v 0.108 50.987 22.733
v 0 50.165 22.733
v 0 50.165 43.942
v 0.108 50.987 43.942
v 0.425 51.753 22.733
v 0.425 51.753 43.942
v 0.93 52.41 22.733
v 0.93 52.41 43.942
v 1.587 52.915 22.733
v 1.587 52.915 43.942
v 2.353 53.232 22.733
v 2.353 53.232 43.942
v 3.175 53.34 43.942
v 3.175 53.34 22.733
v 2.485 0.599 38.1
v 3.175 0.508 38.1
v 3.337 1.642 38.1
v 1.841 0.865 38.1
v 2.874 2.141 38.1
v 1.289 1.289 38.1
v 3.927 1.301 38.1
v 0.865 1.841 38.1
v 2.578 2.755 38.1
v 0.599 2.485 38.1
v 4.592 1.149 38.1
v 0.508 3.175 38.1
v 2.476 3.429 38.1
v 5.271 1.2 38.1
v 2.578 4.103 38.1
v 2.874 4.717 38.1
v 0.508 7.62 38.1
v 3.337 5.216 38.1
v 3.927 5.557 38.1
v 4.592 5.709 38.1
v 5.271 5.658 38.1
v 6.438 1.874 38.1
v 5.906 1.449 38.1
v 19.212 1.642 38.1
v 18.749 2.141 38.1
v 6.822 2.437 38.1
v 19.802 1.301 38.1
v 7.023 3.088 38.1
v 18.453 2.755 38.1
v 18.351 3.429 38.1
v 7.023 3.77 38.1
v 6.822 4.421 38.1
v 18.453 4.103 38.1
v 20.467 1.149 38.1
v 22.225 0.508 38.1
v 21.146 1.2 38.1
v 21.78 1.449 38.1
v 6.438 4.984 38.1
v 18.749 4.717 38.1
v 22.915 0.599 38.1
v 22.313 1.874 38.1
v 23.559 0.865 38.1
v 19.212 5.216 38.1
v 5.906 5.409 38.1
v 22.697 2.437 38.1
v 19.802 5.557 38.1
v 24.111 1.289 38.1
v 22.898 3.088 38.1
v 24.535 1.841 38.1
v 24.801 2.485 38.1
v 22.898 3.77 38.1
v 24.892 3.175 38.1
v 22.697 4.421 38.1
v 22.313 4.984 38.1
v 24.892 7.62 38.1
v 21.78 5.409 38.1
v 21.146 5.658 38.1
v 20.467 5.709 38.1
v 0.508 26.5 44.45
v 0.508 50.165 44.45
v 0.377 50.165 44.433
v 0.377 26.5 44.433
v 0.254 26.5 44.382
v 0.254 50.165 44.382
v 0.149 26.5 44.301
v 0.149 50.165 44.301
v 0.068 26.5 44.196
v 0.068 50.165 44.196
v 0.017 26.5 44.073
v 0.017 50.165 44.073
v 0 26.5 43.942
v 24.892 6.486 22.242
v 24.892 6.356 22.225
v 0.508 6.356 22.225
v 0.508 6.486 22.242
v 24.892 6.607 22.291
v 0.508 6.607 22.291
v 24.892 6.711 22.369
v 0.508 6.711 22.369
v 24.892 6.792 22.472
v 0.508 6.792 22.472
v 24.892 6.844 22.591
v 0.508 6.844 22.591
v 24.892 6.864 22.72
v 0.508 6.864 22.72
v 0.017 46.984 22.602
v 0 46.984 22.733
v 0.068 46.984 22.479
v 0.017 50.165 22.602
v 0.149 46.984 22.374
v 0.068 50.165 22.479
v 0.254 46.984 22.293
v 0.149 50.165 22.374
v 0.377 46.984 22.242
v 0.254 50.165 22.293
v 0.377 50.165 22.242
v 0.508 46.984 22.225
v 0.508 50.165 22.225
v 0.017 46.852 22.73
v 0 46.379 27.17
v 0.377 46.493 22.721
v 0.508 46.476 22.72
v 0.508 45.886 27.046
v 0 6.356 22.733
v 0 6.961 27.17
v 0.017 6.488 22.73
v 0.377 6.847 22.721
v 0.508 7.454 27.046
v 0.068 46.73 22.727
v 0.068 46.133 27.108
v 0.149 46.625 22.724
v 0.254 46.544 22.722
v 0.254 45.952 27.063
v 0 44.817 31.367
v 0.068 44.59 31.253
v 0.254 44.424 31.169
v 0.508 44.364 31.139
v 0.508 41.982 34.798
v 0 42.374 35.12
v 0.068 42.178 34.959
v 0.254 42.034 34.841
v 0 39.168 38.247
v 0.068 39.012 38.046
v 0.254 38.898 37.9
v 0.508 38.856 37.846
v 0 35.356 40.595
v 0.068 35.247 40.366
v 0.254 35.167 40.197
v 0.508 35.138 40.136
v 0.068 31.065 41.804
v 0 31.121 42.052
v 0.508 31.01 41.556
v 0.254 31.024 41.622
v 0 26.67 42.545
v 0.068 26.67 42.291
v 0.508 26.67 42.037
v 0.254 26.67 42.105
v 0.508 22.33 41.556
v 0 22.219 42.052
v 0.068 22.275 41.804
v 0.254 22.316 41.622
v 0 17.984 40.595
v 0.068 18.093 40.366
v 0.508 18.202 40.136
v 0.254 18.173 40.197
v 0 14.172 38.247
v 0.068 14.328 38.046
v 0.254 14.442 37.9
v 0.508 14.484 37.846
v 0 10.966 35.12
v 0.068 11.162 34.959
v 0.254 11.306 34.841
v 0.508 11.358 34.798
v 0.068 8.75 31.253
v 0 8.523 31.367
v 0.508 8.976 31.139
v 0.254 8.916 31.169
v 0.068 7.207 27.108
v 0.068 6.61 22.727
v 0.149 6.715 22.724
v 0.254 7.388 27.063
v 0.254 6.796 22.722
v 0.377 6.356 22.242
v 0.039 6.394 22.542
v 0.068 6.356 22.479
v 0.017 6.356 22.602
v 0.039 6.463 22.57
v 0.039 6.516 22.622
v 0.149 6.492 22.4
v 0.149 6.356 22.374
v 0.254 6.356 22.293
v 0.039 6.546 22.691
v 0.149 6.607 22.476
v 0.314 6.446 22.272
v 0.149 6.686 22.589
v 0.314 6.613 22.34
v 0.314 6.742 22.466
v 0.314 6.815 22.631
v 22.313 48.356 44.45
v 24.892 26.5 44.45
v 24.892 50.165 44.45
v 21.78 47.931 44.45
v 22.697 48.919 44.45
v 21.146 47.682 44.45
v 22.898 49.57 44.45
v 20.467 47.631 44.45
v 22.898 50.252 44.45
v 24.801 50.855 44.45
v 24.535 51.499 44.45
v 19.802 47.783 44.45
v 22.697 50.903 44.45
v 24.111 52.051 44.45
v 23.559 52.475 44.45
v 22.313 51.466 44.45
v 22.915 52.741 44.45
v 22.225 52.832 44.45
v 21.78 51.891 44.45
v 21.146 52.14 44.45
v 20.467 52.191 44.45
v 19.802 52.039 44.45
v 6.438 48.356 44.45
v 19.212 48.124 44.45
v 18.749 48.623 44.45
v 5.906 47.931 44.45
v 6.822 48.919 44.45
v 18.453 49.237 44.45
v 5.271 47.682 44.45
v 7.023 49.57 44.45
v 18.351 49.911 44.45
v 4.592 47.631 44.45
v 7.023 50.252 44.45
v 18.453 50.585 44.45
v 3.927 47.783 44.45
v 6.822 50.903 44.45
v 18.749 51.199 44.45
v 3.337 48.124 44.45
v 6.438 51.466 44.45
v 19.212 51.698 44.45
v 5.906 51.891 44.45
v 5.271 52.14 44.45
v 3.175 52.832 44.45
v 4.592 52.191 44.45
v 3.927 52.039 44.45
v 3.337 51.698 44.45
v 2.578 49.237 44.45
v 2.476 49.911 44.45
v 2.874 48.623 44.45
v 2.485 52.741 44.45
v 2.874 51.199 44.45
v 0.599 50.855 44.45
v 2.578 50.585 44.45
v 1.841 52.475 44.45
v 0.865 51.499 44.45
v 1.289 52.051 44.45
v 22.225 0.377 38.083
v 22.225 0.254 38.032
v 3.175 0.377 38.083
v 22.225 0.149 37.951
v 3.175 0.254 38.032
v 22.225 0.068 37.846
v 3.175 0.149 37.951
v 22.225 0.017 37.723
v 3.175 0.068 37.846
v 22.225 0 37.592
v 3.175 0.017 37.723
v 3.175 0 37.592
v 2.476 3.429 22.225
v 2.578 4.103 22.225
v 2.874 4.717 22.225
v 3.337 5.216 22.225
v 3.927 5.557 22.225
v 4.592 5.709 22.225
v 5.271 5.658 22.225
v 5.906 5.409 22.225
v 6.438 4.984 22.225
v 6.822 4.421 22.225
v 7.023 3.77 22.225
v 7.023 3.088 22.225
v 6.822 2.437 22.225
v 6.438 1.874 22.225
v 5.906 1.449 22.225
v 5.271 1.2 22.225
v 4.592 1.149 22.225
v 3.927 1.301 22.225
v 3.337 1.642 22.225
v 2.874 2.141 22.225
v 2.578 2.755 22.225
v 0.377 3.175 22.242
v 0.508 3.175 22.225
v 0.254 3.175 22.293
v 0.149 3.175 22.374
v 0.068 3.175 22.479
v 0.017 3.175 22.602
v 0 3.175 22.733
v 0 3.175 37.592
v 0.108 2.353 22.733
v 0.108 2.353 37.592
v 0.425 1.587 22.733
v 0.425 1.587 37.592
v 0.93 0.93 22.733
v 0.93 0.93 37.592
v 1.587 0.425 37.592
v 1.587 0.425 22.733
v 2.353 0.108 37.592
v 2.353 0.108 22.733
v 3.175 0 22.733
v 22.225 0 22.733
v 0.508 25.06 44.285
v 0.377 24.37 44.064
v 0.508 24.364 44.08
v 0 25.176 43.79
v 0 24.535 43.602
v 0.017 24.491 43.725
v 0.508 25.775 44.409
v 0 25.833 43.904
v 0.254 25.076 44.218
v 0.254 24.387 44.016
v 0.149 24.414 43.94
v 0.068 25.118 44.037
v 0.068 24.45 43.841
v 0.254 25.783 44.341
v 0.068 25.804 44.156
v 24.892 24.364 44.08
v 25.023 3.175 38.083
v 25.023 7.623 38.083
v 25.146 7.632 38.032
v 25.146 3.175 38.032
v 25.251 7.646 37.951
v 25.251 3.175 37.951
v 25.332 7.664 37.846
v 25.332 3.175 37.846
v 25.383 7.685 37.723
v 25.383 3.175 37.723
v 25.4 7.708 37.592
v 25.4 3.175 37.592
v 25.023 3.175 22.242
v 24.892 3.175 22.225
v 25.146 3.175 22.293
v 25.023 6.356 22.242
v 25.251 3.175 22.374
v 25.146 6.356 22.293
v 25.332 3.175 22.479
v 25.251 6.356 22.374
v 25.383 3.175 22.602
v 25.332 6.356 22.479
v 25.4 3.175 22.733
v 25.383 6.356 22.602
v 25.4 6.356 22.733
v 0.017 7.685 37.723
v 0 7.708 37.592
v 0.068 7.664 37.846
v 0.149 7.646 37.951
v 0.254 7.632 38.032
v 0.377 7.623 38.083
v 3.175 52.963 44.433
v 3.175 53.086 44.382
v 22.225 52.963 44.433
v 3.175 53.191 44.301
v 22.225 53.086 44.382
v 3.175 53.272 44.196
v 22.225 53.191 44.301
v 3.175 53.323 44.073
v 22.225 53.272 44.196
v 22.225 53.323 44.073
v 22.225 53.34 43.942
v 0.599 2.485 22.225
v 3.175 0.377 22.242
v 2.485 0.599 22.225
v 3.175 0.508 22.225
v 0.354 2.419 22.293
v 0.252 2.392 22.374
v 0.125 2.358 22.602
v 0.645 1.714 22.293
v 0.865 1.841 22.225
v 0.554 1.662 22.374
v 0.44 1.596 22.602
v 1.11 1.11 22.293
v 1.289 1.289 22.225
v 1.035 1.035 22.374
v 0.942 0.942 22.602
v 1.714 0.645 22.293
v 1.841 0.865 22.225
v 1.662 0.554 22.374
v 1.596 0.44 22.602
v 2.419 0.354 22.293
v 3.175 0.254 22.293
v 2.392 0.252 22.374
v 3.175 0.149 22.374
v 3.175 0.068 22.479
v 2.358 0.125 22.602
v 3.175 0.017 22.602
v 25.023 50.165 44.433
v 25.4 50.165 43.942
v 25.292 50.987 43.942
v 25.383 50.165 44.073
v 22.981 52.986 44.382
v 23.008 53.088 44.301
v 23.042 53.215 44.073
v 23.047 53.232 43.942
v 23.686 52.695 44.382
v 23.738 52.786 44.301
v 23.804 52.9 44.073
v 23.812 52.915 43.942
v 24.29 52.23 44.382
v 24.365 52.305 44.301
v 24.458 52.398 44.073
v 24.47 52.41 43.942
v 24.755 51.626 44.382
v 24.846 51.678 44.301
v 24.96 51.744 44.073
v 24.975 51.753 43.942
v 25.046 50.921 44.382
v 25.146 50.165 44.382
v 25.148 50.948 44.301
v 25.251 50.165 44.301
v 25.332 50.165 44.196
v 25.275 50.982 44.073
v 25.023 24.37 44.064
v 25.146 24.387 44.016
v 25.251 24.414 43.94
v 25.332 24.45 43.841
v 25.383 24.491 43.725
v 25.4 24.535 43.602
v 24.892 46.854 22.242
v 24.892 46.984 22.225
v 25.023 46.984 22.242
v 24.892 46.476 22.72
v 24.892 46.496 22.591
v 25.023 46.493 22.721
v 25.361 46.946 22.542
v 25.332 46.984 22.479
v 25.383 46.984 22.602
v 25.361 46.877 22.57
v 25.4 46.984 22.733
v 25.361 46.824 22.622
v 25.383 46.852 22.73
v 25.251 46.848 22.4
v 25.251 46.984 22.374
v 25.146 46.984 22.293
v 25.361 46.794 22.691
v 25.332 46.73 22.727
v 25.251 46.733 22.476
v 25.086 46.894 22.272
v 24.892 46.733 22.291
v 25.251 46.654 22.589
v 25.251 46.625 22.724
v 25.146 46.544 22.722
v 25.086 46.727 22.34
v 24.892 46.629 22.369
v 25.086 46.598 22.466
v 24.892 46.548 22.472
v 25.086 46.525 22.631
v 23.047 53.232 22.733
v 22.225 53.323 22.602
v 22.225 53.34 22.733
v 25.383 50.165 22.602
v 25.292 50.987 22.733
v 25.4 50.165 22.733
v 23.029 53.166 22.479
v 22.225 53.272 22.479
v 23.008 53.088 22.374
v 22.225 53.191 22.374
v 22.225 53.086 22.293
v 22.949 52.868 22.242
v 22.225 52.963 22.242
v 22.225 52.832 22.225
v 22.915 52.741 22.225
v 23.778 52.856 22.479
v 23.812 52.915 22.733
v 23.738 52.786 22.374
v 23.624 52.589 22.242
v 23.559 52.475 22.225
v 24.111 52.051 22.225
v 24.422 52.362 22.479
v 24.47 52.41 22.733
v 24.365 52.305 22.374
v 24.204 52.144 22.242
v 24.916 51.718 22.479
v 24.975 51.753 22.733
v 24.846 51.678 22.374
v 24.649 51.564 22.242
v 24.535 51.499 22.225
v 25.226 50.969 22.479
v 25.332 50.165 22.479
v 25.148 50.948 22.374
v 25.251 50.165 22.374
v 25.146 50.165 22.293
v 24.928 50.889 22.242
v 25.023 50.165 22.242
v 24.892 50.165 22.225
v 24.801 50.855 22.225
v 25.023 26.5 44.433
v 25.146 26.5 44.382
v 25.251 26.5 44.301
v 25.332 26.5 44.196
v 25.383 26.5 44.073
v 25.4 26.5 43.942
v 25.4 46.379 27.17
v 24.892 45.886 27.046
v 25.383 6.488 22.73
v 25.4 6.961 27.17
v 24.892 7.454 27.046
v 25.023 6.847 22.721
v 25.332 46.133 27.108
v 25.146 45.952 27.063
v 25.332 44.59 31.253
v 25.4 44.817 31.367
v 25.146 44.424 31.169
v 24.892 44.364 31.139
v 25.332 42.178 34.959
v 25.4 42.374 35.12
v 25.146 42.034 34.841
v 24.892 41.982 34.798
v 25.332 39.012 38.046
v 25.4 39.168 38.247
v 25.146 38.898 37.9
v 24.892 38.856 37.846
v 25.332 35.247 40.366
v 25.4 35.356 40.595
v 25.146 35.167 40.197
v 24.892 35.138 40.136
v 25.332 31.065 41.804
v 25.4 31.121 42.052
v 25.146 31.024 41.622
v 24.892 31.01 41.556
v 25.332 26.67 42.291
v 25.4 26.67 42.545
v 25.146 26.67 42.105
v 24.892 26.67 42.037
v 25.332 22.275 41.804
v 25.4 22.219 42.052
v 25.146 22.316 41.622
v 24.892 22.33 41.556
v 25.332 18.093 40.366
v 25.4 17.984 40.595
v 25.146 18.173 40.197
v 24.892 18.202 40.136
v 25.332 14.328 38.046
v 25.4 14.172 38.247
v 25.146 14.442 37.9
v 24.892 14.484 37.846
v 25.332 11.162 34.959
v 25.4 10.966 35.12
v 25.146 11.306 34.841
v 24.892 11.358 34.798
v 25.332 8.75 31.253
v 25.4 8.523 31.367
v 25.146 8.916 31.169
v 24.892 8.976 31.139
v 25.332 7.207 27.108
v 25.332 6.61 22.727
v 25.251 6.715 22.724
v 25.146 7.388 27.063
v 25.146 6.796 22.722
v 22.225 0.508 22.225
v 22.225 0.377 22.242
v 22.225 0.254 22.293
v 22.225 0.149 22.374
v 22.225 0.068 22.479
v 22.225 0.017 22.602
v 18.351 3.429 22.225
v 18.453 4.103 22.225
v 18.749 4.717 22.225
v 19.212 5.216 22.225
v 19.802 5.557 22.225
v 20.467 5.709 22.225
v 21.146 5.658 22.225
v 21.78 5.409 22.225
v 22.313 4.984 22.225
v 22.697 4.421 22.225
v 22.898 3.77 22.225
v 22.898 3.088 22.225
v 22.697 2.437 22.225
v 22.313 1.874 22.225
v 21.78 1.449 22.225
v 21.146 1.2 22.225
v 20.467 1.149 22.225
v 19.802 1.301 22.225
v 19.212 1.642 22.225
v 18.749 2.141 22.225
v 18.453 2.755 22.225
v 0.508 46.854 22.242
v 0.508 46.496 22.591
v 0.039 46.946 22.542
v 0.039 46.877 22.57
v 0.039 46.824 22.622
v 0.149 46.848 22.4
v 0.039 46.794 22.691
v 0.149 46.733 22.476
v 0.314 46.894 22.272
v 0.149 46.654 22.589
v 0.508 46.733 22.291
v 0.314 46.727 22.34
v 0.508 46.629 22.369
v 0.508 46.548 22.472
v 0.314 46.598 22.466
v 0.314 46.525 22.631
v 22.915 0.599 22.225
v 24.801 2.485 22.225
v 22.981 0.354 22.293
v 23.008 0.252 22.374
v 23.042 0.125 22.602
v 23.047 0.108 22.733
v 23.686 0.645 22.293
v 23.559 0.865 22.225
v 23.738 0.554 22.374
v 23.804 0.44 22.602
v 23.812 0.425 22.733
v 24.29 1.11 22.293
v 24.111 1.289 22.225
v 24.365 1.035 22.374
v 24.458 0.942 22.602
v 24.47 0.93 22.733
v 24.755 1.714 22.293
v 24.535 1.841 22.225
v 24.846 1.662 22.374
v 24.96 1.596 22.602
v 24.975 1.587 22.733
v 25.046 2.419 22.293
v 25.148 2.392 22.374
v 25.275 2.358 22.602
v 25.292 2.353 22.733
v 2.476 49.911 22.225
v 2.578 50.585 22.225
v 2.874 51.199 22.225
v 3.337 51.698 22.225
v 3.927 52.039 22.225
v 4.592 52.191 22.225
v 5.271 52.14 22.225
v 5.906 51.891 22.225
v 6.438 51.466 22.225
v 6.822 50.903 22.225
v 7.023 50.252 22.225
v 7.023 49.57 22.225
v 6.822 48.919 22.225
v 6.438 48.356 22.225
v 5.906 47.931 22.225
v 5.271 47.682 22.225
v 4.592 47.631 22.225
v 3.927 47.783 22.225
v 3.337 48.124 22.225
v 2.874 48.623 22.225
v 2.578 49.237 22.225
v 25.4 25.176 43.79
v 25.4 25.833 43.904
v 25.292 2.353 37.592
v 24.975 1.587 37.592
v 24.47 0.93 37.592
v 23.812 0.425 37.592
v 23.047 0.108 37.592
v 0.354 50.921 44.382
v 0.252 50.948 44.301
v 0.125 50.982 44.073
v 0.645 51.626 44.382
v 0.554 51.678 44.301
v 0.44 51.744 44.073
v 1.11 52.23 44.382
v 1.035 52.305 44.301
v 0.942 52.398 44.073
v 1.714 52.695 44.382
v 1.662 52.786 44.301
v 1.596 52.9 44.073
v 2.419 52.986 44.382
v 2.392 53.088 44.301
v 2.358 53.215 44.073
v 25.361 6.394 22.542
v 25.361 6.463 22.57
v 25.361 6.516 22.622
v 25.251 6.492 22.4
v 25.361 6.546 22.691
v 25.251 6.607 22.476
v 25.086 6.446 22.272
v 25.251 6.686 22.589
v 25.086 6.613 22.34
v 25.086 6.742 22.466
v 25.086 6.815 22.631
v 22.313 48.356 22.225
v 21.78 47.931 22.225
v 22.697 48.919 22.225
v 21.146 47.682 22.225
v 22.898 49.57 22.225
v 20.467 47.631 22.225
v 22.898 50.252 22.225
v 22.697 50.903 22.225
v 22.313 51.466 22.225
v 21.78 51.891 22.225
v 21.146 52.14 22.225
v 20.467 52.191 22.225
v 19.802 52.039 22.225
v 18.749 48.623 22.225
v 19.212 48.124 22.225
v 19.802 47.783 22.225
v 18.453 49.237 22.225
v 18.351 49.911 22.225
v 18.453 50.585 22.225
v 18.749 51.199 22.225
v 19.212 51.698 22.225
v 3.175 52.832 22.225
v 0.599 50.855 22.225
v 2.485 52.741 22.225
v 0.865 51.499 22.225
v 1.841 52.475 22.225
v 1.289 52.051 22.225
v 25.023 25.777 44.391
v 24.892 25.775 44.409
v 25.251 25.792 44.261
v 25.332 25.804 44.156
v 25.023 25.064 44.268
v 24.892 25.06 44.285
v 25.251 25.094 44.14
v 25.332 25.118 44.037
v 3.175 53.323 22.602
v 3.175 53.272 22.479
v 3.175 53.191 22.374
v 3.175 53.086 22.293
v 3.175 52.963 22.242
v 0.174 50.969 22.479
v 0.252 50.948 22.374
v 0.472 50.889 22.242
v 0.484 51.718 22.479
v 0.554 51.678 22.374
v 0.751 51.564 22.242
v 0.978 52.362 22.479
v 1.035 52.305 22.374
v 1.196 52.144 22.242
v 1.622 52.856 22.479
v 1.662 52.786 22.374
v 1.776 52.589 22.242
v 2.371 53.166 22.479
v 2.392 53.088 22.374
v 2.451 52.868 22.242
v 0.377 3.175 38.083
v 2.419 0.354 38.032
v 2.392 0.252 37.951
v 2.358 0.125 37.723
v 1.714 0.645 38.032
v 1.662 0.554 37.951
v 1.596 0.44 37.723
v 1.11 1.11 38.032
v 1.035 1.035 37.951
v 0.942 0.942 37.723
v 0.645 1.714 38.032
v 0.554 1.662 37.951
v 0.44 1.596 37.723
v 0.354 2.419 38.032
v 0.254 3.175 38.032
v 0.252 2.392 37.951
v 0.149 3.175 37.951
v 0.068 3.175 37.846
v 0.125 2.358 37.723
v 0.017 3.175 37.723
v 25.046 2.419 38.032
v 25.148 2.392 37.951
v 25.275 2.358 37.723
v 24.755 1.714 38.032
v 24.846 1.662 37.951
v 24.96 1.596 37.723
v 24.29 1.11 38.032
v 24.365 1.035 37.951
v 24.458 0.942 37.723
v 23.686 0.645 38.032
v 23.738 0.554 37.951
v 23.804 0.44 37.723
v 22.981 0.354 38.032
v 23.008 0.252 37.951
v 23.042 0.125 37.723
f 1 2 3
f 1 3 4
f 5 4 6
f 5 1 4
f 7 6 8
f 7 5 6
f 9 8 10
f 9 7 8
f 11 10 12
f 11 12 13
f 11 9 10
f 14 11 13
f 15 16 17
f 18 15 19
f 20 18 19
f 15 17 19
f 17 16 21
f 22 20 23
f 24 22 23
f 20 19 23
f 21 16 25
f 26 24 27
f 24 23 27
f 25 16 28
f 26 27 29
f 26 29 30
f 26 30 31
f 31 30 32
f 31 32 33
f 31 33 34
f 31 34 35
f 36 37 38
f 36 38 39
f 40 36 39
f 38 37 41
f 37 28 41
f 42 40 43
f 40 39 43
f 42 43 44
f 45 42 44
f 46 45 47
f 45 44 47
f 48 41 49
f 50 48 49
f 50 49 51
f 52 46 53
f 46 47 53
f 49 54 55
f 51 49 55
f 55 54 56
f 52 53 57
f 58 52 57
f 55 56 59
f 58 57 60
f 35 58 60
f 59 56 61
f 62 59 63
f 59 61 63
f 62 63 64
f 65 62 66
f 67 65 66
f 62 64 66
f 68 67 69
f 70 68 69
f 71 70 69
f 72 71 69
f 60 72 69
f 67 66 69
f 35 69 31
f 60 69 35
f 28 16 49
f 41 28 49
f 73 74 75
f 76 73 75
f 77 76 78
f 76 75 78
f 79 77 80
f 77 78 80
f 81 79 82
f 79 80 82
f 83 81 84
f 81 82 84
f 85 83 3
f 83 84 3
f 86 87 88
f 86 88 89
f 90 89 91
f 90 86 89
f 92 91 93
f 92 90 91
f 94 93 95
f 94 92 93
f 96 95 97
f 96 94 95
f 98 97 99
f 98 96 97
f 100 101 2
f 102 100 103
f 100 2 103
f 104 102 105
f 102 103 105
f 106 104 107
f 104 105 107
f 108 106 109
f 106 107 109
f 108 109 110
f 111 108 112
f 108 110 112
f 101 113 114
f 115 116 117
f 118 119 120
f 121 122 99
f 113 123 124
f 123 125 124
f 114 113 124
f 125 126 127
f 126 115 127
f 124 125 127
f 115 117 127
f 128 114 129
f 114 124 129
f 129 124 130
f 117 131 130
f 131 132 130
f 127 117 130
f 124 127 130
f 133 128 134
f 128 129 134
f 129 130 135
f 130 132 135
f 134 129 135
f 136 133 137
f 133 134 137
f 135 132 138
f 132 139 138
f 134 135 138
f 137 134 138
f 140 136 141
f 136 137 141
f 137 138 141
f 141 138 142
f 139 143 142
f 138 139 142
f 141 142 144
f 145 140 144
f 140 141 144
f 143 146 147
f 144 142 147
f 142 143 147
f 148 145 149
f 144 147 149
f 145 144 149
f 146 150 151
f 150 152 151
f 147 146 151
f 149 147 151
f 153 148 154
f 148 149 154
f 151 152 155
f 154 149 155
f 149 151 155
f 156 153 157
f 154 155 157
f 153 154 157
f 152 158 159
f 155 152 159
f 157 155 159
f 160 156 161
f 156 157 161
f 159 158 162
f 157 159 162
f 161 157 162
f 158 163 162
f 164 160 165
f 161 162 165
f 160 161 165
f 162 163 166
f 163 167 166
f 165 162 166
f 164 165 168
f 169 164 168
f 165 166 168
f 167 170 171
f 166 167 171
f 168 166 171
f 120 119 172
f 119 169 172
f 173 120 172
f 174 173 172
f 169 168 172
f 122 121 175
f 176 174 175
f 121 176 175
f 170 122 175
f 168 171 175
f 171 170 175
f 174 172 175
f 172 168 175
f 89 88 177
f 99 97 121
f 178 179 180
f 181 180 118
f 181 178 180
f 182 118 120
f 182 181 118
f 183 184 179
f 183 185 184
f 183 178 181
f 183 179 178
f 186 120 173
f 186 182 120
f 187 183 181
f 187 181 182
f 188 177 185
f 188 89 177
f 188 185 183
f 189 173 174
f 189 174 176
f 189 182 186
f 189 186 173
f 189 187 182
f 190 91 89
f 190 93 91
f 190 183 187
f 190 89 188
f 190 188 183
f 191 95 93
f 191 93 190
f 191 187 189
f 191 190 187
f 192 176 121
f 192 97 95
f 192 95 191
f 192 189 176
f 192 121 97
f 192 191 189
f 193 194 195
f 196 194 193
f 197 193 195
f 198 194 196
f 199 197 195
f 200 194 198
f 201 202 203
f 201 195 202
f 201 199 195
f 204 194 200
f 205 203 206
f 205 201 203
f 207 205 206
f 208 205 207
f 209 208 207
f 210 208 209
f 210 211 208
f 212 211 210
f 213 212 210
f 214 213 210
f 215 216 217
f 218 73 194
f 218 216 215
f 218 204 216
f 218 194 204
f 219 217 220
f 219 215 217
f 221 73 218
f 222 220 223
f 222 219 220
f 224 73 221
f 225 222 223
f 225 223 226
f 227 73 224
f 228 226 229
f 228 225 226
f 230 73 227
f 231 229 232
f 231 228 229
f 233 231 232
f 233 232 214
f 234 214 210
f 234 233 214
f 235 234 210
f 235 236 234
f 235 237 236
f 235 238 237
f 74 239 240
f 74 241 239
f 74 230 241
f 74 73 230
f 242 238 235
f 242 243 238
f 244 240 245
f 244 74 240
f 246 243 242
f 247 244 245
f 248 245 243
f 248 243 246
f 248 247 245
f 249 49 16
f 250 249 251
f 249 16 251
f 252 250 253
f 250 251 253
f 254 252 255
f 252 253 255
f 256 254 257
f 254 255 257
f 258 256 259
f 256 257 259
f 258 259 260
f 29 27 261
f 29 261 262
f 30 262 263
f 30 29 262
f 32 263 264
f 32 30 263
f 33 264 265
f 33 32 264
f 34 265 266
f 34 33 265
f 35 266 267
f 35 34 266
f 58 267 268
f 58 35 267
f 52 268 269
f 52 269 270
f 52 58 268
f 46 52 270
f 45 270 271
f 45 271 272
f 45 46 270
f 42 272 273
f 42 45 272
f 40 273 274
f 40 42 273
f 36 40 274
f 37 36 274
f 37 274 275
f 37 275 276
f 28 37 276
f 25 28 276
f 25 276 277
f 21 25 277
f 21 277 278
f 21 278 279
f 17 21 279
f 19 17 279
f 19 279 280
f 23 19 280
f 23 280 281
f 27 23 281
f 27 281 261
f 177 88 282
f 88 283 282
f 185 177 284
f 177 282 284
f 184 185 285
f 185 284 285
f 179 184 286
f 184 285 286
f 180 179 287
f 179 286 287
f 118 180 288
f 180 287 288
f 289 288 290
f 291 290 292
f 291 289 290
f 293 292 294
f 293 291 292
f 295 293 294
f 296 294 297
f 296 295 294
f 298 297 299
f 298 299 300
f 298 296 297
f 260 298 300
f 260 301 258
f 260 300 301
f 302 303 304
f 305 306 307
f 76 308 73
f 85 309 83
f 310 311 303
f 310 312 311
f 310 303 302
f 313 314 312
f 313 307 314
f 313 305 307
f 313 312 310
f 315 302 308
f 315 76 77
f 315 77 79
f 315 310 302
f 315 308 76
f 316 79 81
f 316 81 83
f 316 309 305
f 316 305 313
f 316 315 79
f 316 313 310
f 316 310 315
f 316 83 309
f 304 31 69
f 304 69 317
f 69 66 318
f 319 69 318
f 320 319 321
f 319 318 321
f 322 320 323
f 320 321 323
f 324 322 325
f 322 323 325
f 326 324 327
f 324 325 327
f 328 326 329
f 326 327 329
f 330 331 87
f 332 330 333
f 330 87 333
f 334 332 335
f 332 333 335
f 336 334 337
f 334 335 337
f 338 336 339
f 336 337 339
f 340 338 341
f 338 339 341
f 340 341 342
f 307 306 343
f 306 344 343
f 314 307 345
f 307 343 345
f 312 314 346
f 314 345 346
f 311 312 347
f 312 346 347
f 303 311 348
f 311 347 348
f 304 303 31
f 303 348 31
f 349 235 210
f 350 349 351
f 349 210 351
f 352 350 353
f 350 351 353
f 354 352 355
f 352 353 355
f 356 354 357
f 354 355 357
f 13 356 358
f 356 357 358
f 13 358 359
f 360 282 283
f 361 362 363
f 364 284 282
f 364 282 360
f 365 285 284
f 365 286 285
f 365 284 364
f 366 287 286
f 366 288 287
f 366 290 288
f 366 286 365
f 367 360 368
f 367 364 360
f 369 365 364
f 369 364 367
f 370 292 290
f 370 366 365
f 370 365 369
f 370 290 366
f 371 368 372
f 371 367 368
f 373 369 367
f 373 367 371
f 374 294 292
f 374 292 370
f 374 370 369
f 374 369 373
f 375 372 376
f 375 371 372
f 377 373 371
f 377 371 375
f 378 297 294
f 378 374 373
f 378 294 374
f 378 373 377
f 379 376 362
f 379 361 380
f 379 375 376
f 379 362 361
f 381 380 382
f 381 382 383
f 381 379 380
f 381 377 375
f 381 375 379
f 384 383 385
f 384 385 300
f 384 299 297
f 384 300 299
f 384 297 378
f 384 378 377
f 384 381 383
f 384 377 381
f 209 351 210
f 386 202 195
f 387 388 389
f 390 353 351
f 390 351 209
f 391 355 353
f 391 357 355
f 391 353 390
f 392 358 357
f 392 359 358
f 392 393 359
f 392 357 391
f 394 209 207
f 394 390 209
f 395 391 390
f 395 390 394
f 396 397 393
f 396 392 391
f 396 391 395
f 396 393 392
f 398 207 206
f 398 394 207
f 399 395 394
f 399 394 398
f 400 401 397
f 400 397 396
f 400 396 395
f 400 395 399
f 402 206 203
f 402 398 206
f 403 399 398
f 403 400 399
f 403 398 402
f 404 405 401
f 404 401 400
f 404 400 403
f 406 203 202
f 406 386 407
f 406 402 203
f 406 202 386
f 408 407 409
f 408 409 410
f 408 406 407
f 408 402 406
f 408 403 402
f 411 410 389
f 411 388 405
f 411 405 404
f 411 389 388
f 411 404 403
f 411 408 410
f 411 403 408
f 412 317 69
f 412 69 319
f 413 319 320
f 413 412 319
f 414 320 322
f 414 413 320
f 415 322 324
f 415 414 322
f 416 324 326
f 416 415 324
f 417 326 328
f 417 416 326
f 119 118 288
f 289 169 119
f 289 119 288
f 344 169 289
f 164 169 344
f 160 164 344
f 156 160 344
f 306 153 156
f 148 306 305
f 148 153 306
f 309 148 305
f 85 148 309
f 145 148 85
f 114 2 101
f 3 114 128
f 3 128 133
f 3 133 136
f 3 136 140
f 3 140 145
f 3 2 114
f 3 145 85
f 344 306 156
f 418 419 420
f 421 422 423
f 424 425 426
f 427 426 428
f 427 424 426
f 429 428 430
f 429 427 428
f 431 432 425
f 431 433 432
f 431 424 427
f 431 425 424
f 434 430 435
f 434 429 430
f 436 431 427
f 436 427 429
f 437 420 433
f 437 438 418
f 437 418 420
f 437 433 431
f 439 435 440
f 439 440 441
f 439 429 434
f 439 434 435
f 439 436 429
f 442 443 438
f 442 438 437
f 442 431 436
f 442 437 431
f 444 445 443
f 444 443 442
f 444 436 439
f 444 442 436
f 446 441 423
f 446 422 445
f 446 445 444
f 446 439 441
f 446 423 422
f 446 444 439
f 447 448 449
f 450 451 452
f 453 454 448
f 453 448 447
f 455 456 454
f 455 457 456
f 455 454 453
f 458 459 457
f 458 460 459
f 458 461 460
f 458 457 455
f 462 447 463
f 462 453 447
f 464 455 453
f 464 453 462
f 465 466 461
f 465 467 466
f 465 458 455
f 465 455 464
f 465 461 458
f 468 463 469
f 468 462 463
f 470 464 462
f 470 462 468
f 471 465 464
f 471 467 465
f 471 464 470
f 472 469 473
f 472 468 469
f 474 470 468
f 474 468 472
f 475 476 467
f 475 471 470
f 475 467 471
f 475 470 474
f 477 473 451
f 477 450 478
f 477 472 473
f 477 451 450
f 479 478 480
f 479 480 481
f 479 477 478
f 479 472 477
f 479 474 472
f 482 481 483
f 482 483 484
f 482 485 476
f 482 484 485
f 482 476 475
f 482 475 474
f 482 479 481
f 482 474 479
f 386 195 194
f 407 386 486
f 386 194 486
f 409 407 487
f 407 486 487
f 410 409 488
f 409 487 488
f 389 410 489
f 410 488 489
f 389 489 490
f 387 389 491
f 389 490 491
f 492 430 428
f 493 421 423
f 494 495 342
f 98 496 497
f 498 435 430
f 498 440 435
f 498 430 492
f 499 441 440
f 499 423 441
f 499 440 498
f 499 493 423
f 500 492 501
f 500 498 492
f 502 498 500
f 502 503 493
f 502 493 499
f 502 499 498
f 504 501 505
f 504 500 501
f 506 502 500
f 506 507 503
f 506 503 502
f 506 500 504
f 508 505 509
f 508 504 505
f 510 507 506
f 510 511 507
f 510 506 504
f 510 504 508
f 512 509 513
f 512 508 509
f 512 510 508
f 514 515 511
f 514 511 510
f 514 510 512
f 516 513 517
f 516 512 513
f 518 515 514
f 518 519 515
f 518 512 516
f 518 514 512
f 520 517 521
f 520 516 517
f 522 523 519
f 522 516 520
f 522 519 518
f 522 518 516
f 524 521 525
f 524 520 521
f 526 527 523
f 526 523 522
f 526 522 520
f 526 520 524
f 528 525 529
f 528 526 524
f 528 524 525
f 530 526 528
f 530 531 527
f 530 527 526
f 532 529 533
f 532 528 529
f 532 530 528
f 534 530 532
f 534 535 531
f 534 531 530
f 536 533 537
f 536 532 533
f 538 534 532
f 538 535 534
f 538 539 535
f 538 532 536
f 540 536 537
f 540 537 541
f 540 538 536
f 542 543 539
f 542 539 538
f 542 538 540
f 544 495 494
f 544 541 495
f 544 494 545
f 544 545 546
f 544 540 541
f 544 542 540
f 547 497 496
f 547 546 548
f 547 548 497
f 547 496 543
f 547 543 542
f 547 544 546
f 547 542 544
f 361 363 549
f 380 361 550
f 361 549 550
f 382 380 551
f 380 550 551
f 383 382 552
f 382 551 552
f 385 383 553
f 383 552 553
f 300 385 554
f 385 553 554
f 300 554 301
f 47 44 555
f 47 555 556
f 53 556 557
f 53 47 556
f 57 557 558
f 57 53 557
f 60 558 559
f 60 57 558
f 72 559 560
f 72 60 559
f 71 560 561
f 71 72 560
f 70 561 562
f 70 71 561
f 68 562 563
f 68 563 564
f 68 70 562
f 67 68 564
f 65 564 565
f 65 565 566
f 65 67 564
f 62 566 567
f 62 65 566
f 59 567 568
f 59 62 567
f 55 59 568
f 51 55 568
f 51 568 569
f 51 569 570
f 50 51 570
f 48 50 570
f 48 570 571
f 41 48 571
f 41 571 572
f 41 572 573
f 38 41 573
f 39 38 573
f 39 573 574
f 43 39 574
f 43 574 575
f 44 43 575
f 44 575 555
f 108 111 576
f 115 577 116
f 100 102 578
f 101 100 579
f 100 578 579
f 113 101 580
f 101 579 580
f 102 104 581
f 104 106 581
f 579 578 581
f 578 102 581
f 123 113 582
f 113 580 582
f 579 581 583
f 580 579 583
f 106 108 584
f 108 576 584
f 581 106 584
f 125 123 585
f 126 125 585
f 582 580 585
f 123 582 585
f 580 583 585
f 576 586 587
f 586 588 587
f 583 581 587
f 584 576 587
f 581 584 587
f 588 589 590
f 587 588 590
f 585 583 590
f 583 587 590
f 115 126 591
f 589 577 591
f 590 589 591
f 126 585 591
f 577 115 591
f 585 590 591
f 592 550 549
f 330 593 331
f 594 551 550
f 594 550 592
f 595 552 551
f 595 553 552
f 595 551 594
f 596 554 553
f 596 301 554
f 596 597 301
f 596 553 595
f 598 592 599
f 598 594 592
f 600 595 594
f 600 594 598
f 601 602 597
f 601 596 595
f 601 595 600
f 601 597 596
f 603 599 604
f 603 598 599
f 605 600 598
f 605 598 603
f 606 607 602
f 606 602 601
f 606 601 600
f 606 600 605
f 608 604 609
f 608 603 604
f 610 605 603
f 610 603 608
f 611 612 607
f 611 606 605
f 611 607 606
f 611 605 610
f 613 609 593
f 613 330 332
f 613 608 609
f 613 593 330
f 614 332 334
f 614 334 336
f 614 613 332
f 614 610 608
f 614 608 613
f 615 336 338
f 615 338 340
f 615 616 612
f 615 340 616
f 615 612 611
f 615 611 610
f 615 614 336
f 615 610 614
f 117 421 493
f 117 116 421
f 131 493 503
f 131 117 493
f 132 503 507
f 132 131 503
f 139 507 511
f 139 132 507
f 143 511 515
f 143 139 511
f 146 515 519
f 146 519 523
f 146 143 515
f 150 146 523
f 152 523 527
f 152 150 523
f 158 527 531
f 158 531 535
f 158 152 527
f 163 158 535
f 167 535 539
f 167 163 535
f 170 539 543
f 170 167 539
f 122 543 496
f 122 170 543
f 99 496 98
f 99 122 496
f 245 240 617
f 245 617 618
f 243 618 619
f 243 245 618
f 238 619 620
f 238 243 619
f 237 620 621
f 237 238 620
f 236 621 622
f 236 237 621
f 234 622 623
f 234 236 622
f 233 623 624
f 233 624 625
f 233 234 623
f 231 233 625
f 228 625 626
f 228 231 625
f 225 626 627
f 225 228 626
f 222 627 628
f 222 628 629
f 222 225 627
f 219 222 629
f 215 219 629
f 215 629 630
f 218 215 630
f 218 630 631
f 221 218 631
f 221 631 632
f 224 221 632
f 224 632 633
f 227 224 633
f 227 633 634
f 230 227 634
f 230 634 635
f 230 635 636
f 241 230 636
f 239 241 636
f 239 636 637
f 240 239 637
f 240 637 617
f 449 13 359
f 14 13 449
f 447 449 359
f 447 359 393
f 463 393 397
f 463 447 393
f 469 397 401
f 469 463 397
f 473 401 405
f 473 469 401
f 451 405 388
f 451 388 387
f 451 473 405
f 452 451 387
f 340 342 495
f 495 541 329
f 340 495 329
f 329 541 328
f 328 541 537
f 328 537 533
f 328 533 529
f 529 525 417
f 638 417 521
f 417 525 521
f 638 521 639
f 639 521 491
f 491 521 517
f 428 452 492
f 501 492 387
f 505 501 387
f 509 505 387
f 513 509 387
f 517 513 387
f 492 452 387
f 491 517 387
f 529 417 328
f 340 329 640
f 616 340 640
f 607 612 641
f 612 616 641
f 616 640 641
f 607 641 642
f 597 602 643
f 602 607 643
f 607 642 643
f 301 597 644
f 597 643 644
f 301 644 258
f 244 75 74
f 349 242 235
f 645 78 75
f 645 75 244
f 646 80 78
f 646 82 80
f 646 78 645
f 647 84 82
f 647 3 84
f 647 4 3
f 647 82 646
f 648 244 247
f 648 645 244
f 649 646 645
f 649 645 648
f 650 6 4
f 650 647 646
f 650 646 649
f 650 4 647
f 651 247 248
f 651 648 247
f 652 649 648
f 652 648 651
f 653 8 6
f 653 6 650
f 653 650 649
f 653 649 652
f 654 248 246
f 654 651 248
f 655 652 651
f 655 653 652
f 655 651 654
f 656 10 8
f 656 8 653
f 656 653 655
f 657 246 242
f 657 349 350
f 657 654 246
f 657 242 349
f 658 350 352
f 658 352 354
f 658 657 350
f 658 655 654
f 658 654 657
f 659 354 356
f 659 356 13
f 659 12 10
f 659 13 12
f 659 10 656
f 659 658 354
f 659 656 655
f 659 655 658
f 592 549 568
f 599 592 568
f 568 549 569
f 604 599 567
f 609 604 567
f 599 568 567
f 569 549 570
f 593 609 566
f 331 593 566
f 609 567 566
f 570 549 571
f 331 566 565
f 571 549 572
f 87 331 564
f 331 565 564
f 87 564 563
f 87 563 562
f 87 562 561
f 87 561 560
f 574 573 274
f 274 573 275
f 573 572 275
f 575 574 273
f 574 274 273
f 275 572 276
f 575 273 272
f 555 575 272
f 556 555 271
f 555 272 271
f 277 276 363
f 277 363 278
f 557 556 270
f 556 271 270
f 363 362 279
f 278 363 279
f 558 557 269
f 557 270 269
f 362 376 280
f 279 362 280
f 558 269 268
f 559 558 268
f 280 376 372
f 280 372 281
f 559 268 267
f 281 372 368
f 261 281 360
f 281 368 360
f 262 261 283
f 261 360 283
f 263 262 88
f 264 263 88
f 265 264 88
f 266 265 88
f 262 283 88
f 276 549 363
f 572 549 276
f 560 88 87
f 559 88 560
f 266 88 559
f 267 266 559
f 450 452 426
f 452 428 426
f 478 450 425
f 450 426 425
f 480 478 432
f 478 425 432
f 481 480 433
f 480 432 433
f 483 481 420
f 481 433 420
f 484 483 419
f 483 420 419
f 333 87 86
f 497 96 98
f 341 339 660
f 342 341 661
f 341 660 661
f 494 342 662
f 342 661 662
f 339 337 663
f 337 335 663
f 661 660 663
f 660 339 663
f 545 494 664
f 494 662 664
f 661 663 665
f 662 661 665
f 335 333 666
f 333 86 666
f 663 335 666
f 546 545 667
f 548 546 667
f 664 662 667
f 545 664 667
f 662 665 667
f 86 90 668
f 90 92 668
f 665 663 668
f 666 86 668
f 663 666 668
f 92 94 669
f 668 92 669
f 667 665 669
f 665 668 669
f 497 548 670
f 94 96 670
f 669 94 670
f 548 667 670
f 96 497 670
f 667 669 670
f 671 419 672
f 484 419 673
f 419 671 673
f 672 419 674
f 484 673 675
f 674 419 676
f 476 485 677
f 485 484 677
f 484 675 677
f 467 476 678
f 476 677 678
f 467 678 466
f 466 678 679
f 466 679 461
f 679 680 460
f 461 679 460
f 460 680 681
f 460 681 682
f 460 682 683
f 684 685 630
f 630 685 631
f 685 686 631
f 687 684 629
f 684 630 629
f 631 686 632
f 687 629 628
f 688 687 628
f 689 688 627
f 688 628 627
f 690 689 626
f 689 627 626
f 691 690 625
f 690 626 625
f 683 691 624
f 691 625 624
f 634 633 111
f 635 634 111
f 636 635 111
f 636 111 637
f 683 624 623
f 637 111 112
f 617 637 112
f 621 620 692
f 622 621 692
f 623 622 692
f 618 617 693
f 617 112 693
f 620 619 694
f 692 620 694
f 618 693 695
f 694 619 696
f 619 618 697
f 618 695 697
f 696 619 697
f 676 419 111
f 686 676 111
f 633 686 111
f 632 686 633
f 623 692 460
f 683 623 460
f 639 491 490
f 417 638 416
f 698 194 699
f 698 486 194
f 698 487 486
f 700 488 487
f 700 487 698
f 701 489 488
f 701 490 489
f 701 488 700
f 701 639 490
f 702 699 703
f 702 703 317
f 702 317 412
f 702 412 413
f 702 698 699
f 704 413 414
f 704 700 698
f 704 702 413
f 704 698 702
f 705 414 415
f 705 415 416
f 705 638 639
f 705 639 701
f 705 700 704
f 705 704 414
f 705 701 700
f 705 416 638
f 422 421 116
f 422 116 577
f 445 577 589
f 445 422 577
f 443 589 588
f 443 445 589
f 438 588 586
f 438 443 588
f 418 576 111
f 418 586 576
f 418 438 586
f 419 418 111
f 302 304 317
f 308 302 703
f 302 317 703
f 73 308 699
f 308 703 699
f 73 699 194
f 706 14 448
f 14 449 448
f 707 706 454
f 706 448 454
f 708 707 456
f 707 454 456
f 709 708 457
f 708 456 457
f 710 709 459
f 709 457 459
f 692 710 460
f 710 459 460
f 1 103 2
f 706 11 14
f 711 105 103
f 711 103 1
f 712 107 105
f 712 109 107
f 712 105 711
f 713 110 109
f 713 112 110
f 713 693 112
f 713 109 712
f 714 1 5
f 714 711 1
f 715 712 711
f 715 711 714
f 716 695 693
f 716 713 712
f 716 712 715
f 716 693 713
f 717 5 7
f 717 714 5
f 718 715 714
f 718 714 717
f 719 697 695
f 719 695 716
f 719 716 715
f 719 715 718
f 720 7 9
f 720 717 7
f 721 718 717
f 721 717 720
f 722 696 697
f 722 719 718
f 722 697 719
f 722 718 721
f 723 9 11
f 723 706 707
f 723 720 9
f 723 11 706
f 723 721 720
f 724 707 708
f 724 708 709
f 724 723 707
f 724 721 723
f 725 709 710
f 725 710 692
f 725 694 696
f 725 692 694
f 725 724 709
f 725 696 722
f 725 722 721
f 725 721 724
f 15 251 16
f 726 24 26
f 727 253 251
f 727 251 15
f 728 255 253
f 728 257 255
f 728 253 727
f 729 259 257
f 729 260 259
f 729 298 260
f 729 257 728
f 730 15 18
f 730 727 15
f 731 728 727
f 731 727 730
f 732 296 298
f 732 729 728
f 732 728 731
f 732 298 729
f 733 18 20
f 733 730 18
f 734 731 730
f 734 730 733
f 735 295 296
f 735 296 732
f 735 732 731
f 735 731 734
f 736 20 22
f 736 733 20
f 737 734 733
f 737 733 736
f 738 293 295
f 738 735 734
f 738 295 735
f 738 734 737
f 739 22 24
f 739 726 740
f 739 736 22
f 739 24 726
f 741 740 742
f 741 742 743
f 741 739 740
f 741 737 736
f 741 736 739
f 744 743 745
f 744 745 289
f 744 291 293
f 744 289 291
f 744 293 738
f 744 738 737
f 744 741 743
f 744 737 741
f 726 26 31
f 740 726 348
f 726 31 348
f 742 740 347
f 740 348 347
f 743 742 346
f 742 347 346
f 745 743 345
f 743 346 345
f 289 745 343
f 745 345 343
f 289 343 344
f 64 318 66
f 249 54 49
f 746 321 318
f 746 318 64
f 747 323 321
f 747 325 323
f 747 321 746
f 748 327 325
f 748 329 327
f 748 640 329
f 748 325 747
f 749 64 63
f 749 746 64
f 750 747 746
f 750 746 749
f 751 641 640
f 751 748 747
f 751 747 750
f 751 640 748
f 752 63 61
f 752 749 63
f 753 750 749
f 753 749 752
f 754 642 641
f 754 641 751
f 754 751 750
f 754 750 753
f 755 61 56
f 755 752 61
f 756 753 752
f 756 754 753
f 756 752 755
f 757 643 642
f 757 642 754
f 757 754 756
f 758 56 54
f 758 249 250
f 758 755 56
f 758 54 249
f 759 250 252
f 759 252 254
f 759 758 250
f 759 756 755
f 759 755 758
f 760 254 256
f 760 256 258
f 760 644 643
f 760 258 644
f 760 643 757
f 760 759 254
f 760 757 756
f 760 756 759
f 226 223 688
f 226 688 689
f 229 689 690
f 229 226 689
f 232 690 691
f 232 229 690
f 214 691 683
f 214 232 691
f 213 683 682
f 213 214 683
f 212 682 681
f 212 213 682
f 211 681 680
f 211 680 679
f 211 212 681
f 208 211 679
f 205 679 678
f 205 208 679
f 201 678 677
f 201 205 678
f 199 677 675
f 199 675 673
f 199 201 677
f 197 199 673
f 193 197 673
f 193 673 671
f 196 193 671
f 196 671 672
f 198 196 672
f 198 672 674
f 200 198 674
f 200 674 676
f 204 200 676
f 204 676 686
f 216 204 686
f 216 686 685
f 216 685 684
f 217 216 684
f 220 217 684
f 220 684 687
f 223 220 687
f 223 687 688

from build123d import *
from build123d.topology import SkipClean

# Parameters (mm, degrees)
BOSS_EXTRUDE1_DEPTH       = 25.4
F_8_0_18_DIAMETER_HOLE1_D = 4.572
SKETCH8_W                 = 22.225
SKETCH8_H                 = 53.34
CUT_EXTRUDE1_DEPTH        = 74.933200255
CUT_EXTRUDE2_DEPTH        = 74.933200255
FILLET1_R                 = 3.175
FILLET3_R                 = 0.508
FILLET4_R                 = 6.35


with BuildPart() as part:
    # Sketch1 → Boss-Extrude1 (new body)
    with BuildSketch(Plane(origin=(0, 0, 0), x_dir=(0, 0, -1), z_dir=(1, 0, 0))):
        with BuildLine():
            Line((0, 0), (0, 53.34))
            Line((0, 53.34), (-22.225, 53.34))
            Line((-22.225, 53.34), (-22.225, 46.482))
            ThreePointArc((-22.225, 46.482), (-2.413, 26.67), (-22.225, 6.858))
            Line((-22.225, 6.858), (-22.225, 0))
            Line((-22.225, 0), (0, 0))
        make_face()
    boss_extrude1 = extrude(amount=BOSS_EXTRUDE1_DEPTH)

    # #8 (0.18) Diameter Hole1 (through all)
    with Locations(Plane.XY.offset(22.225)):
        with Locations((4.7625, 49.911), (20.6375, 49.911), (20.6375, 3.429), (4.7625, 3.429)):
            f_8_0_18_diameter_hole1 = Hole(F_8_0_18_DIAMETER_HOLE1_D / 2)

    # Mirror1: Boss-Extrude1, #8 (0.18) Diameter Hole1 across plane
    with SkipClean():  # the faces are left unmerged after this step: merging them gives an invalid solid
        add(boss_extrude1.mirror(Plane(origin=(25.4, 53.34, 22.225), x_dir=(1, 0, 0), z_dir=(0, 0, -1))))
        add(f_8_0_18_diameter_hole1.mirror(Plane(origin=(25.4, 53.34, 22.225), x_dir=(1, 0, 0), z_dir=(0, 0, -1))), mode=Mode.SUBTRACT)

    # Sketch8 → Cut-Extrude1 (cut, through all)
    with BuildSketch(Plane.ZY):
        with Locations((11.1125, 26.67)):
            Rectangle(SKETCH8_W, SKETCH8_H)
    extrude(amount=-CUT_EXTRUDE1_DEPTH, mode=Mode.SUBTRACT)

    # Sketch9 → Cut-Extrude2 (cut, through all)
    with BuildSketch(Plane(origin=(25.4, 0, 0), x_dir=(0, 0, -1), z_dir=(1, 0, 0))):
        Polygon((-44.45, 0), (-38.1, 0), (-38.1, 7.62), (-44.45, 25.4), align=None)
    extrude(amount=-CUT_EXTRUDE2_DEPTH, mode=Mode.SUBTRACT)

    # Fillet1
    fillet1_edges = [part.edges().sort_by_distance(p)[0] for p in [
        (0, 0, 30.1625),
        (25.4, 0, 30.1625),
        (0, 53.34, 33.3375),
        (25.4, 53.34, 33.3375),
    ]]
    fillet(fillet1_edges, radius=FILLET1_R)

    # Fillet3
    fillet3_edges = [part.edges().sort_by_distance(p)[0] for p in [
        (0, 37.7825, 44.45),
        (25.4, 37.7825, 44.45),
        (0, 16.51, 41.275),
        (25.4, 16.51, 41.275),
        (12.7, 0, 38.1),
        (12.7, 0, 22.225),
        (25.4, 5.0165, 22.225),
        (0, 5.0165, 22.225),
        (24.47006403, 0.92993597, 22.225),
        (0.92993597, 0.92993597, 22.225),
        (0, 5.3975, 38.1),
        (25.4, 5.3975, 38.1),
        (24.47006403, 0.92993597, 38.1),
        (0.92993597, 0.92993597, 38.1),
        (12.7, 53.34, 44.45),
        (0.92993597, 52.41006403, 44.45),
        (24.47006403, 52.41006403, 44.45),
        (12.7, 53.34, 22.225),
        (0.92993597, 52.41006403, 22.225),
        (24.47006403, 52.41006403, 22.225),
        (25.4, 26.67, 42.037),
        (0, 26.67, 42.037),
        (0, 48.3235, 22.225),
        (12.7, 46.482, 22.225),
        (25.4, 48.3235, 22.225),
        (12.7, 6.858, 22.225),
    ]]
    fillet(fillet3_edges, radius=FILLET3_R)

    # Fillet4
    # the kernel refuses this fillet: 6.35 mm, written as the material it takes off along each edge
    with BuildSketch(Plane(origin=(25.4, 26.499907309, 38.1), x_dir=(0, 0, 1), z_dir=(0, 1, 0))) as fillet4_piece_1:
        with BuildLine():
            CenterArc((5.842, -0.508), 0.508, 0, 90)
            Line((6.35, -0.508), (6.35, 0))
            Line((6.35, 0), (5.842, 0))
        make_face()
    revolve(axis=Axis((25.4, 26.499907309, 38.1), (1, 0, 0)), revolution_arc=19.653824058, mode=Mode.SUBTRACT)
    with BuildSketch(Plane(origin=(0, 26.499907309, 38.1), x_dir=(0, -0.3363363969981563, 0.9417419115948376), z_dir=(0, -0.9417419115948376, -0.3363363969981563))) as fillet4_piece_2:
        with BuildLine():
            CenterArc((5.842, -0.508), 0.508, 0, 90)
            Line((6.35, -0.508), (6.35, 0))
            Line((6.35, 0), (5.842, 0))
        make_face()
    revolve(axis=Axis((0, 26.499907309, 38.1), (-1, 0, 0)), revolution_arc=19.653824058, mode=Mode.SUBTRACT)
    with BuildSketch(Plane(origin=(25.4, 25.4, 44.45), x_dir=(0, 1, 0), z_dir=(-1, 0, 0))) as fillet4_piece_3:
        with BuildLine():
            CenterArc((FILLET4_R * 0.173213749464, FILLET4_R), FILLET4_R, 250.346175942, 19.653824058)
            Line((-FILLET4_R * 0.163122647534, FILLET4_R * 0.0582580884052), (0, 0))
            Line((0, 0), (FILLET4_R * 0.173213749464, 0))
        make_face()
    extrude(amount=25.4, mode=Mode.SUBTRACT)


solid = part.part
